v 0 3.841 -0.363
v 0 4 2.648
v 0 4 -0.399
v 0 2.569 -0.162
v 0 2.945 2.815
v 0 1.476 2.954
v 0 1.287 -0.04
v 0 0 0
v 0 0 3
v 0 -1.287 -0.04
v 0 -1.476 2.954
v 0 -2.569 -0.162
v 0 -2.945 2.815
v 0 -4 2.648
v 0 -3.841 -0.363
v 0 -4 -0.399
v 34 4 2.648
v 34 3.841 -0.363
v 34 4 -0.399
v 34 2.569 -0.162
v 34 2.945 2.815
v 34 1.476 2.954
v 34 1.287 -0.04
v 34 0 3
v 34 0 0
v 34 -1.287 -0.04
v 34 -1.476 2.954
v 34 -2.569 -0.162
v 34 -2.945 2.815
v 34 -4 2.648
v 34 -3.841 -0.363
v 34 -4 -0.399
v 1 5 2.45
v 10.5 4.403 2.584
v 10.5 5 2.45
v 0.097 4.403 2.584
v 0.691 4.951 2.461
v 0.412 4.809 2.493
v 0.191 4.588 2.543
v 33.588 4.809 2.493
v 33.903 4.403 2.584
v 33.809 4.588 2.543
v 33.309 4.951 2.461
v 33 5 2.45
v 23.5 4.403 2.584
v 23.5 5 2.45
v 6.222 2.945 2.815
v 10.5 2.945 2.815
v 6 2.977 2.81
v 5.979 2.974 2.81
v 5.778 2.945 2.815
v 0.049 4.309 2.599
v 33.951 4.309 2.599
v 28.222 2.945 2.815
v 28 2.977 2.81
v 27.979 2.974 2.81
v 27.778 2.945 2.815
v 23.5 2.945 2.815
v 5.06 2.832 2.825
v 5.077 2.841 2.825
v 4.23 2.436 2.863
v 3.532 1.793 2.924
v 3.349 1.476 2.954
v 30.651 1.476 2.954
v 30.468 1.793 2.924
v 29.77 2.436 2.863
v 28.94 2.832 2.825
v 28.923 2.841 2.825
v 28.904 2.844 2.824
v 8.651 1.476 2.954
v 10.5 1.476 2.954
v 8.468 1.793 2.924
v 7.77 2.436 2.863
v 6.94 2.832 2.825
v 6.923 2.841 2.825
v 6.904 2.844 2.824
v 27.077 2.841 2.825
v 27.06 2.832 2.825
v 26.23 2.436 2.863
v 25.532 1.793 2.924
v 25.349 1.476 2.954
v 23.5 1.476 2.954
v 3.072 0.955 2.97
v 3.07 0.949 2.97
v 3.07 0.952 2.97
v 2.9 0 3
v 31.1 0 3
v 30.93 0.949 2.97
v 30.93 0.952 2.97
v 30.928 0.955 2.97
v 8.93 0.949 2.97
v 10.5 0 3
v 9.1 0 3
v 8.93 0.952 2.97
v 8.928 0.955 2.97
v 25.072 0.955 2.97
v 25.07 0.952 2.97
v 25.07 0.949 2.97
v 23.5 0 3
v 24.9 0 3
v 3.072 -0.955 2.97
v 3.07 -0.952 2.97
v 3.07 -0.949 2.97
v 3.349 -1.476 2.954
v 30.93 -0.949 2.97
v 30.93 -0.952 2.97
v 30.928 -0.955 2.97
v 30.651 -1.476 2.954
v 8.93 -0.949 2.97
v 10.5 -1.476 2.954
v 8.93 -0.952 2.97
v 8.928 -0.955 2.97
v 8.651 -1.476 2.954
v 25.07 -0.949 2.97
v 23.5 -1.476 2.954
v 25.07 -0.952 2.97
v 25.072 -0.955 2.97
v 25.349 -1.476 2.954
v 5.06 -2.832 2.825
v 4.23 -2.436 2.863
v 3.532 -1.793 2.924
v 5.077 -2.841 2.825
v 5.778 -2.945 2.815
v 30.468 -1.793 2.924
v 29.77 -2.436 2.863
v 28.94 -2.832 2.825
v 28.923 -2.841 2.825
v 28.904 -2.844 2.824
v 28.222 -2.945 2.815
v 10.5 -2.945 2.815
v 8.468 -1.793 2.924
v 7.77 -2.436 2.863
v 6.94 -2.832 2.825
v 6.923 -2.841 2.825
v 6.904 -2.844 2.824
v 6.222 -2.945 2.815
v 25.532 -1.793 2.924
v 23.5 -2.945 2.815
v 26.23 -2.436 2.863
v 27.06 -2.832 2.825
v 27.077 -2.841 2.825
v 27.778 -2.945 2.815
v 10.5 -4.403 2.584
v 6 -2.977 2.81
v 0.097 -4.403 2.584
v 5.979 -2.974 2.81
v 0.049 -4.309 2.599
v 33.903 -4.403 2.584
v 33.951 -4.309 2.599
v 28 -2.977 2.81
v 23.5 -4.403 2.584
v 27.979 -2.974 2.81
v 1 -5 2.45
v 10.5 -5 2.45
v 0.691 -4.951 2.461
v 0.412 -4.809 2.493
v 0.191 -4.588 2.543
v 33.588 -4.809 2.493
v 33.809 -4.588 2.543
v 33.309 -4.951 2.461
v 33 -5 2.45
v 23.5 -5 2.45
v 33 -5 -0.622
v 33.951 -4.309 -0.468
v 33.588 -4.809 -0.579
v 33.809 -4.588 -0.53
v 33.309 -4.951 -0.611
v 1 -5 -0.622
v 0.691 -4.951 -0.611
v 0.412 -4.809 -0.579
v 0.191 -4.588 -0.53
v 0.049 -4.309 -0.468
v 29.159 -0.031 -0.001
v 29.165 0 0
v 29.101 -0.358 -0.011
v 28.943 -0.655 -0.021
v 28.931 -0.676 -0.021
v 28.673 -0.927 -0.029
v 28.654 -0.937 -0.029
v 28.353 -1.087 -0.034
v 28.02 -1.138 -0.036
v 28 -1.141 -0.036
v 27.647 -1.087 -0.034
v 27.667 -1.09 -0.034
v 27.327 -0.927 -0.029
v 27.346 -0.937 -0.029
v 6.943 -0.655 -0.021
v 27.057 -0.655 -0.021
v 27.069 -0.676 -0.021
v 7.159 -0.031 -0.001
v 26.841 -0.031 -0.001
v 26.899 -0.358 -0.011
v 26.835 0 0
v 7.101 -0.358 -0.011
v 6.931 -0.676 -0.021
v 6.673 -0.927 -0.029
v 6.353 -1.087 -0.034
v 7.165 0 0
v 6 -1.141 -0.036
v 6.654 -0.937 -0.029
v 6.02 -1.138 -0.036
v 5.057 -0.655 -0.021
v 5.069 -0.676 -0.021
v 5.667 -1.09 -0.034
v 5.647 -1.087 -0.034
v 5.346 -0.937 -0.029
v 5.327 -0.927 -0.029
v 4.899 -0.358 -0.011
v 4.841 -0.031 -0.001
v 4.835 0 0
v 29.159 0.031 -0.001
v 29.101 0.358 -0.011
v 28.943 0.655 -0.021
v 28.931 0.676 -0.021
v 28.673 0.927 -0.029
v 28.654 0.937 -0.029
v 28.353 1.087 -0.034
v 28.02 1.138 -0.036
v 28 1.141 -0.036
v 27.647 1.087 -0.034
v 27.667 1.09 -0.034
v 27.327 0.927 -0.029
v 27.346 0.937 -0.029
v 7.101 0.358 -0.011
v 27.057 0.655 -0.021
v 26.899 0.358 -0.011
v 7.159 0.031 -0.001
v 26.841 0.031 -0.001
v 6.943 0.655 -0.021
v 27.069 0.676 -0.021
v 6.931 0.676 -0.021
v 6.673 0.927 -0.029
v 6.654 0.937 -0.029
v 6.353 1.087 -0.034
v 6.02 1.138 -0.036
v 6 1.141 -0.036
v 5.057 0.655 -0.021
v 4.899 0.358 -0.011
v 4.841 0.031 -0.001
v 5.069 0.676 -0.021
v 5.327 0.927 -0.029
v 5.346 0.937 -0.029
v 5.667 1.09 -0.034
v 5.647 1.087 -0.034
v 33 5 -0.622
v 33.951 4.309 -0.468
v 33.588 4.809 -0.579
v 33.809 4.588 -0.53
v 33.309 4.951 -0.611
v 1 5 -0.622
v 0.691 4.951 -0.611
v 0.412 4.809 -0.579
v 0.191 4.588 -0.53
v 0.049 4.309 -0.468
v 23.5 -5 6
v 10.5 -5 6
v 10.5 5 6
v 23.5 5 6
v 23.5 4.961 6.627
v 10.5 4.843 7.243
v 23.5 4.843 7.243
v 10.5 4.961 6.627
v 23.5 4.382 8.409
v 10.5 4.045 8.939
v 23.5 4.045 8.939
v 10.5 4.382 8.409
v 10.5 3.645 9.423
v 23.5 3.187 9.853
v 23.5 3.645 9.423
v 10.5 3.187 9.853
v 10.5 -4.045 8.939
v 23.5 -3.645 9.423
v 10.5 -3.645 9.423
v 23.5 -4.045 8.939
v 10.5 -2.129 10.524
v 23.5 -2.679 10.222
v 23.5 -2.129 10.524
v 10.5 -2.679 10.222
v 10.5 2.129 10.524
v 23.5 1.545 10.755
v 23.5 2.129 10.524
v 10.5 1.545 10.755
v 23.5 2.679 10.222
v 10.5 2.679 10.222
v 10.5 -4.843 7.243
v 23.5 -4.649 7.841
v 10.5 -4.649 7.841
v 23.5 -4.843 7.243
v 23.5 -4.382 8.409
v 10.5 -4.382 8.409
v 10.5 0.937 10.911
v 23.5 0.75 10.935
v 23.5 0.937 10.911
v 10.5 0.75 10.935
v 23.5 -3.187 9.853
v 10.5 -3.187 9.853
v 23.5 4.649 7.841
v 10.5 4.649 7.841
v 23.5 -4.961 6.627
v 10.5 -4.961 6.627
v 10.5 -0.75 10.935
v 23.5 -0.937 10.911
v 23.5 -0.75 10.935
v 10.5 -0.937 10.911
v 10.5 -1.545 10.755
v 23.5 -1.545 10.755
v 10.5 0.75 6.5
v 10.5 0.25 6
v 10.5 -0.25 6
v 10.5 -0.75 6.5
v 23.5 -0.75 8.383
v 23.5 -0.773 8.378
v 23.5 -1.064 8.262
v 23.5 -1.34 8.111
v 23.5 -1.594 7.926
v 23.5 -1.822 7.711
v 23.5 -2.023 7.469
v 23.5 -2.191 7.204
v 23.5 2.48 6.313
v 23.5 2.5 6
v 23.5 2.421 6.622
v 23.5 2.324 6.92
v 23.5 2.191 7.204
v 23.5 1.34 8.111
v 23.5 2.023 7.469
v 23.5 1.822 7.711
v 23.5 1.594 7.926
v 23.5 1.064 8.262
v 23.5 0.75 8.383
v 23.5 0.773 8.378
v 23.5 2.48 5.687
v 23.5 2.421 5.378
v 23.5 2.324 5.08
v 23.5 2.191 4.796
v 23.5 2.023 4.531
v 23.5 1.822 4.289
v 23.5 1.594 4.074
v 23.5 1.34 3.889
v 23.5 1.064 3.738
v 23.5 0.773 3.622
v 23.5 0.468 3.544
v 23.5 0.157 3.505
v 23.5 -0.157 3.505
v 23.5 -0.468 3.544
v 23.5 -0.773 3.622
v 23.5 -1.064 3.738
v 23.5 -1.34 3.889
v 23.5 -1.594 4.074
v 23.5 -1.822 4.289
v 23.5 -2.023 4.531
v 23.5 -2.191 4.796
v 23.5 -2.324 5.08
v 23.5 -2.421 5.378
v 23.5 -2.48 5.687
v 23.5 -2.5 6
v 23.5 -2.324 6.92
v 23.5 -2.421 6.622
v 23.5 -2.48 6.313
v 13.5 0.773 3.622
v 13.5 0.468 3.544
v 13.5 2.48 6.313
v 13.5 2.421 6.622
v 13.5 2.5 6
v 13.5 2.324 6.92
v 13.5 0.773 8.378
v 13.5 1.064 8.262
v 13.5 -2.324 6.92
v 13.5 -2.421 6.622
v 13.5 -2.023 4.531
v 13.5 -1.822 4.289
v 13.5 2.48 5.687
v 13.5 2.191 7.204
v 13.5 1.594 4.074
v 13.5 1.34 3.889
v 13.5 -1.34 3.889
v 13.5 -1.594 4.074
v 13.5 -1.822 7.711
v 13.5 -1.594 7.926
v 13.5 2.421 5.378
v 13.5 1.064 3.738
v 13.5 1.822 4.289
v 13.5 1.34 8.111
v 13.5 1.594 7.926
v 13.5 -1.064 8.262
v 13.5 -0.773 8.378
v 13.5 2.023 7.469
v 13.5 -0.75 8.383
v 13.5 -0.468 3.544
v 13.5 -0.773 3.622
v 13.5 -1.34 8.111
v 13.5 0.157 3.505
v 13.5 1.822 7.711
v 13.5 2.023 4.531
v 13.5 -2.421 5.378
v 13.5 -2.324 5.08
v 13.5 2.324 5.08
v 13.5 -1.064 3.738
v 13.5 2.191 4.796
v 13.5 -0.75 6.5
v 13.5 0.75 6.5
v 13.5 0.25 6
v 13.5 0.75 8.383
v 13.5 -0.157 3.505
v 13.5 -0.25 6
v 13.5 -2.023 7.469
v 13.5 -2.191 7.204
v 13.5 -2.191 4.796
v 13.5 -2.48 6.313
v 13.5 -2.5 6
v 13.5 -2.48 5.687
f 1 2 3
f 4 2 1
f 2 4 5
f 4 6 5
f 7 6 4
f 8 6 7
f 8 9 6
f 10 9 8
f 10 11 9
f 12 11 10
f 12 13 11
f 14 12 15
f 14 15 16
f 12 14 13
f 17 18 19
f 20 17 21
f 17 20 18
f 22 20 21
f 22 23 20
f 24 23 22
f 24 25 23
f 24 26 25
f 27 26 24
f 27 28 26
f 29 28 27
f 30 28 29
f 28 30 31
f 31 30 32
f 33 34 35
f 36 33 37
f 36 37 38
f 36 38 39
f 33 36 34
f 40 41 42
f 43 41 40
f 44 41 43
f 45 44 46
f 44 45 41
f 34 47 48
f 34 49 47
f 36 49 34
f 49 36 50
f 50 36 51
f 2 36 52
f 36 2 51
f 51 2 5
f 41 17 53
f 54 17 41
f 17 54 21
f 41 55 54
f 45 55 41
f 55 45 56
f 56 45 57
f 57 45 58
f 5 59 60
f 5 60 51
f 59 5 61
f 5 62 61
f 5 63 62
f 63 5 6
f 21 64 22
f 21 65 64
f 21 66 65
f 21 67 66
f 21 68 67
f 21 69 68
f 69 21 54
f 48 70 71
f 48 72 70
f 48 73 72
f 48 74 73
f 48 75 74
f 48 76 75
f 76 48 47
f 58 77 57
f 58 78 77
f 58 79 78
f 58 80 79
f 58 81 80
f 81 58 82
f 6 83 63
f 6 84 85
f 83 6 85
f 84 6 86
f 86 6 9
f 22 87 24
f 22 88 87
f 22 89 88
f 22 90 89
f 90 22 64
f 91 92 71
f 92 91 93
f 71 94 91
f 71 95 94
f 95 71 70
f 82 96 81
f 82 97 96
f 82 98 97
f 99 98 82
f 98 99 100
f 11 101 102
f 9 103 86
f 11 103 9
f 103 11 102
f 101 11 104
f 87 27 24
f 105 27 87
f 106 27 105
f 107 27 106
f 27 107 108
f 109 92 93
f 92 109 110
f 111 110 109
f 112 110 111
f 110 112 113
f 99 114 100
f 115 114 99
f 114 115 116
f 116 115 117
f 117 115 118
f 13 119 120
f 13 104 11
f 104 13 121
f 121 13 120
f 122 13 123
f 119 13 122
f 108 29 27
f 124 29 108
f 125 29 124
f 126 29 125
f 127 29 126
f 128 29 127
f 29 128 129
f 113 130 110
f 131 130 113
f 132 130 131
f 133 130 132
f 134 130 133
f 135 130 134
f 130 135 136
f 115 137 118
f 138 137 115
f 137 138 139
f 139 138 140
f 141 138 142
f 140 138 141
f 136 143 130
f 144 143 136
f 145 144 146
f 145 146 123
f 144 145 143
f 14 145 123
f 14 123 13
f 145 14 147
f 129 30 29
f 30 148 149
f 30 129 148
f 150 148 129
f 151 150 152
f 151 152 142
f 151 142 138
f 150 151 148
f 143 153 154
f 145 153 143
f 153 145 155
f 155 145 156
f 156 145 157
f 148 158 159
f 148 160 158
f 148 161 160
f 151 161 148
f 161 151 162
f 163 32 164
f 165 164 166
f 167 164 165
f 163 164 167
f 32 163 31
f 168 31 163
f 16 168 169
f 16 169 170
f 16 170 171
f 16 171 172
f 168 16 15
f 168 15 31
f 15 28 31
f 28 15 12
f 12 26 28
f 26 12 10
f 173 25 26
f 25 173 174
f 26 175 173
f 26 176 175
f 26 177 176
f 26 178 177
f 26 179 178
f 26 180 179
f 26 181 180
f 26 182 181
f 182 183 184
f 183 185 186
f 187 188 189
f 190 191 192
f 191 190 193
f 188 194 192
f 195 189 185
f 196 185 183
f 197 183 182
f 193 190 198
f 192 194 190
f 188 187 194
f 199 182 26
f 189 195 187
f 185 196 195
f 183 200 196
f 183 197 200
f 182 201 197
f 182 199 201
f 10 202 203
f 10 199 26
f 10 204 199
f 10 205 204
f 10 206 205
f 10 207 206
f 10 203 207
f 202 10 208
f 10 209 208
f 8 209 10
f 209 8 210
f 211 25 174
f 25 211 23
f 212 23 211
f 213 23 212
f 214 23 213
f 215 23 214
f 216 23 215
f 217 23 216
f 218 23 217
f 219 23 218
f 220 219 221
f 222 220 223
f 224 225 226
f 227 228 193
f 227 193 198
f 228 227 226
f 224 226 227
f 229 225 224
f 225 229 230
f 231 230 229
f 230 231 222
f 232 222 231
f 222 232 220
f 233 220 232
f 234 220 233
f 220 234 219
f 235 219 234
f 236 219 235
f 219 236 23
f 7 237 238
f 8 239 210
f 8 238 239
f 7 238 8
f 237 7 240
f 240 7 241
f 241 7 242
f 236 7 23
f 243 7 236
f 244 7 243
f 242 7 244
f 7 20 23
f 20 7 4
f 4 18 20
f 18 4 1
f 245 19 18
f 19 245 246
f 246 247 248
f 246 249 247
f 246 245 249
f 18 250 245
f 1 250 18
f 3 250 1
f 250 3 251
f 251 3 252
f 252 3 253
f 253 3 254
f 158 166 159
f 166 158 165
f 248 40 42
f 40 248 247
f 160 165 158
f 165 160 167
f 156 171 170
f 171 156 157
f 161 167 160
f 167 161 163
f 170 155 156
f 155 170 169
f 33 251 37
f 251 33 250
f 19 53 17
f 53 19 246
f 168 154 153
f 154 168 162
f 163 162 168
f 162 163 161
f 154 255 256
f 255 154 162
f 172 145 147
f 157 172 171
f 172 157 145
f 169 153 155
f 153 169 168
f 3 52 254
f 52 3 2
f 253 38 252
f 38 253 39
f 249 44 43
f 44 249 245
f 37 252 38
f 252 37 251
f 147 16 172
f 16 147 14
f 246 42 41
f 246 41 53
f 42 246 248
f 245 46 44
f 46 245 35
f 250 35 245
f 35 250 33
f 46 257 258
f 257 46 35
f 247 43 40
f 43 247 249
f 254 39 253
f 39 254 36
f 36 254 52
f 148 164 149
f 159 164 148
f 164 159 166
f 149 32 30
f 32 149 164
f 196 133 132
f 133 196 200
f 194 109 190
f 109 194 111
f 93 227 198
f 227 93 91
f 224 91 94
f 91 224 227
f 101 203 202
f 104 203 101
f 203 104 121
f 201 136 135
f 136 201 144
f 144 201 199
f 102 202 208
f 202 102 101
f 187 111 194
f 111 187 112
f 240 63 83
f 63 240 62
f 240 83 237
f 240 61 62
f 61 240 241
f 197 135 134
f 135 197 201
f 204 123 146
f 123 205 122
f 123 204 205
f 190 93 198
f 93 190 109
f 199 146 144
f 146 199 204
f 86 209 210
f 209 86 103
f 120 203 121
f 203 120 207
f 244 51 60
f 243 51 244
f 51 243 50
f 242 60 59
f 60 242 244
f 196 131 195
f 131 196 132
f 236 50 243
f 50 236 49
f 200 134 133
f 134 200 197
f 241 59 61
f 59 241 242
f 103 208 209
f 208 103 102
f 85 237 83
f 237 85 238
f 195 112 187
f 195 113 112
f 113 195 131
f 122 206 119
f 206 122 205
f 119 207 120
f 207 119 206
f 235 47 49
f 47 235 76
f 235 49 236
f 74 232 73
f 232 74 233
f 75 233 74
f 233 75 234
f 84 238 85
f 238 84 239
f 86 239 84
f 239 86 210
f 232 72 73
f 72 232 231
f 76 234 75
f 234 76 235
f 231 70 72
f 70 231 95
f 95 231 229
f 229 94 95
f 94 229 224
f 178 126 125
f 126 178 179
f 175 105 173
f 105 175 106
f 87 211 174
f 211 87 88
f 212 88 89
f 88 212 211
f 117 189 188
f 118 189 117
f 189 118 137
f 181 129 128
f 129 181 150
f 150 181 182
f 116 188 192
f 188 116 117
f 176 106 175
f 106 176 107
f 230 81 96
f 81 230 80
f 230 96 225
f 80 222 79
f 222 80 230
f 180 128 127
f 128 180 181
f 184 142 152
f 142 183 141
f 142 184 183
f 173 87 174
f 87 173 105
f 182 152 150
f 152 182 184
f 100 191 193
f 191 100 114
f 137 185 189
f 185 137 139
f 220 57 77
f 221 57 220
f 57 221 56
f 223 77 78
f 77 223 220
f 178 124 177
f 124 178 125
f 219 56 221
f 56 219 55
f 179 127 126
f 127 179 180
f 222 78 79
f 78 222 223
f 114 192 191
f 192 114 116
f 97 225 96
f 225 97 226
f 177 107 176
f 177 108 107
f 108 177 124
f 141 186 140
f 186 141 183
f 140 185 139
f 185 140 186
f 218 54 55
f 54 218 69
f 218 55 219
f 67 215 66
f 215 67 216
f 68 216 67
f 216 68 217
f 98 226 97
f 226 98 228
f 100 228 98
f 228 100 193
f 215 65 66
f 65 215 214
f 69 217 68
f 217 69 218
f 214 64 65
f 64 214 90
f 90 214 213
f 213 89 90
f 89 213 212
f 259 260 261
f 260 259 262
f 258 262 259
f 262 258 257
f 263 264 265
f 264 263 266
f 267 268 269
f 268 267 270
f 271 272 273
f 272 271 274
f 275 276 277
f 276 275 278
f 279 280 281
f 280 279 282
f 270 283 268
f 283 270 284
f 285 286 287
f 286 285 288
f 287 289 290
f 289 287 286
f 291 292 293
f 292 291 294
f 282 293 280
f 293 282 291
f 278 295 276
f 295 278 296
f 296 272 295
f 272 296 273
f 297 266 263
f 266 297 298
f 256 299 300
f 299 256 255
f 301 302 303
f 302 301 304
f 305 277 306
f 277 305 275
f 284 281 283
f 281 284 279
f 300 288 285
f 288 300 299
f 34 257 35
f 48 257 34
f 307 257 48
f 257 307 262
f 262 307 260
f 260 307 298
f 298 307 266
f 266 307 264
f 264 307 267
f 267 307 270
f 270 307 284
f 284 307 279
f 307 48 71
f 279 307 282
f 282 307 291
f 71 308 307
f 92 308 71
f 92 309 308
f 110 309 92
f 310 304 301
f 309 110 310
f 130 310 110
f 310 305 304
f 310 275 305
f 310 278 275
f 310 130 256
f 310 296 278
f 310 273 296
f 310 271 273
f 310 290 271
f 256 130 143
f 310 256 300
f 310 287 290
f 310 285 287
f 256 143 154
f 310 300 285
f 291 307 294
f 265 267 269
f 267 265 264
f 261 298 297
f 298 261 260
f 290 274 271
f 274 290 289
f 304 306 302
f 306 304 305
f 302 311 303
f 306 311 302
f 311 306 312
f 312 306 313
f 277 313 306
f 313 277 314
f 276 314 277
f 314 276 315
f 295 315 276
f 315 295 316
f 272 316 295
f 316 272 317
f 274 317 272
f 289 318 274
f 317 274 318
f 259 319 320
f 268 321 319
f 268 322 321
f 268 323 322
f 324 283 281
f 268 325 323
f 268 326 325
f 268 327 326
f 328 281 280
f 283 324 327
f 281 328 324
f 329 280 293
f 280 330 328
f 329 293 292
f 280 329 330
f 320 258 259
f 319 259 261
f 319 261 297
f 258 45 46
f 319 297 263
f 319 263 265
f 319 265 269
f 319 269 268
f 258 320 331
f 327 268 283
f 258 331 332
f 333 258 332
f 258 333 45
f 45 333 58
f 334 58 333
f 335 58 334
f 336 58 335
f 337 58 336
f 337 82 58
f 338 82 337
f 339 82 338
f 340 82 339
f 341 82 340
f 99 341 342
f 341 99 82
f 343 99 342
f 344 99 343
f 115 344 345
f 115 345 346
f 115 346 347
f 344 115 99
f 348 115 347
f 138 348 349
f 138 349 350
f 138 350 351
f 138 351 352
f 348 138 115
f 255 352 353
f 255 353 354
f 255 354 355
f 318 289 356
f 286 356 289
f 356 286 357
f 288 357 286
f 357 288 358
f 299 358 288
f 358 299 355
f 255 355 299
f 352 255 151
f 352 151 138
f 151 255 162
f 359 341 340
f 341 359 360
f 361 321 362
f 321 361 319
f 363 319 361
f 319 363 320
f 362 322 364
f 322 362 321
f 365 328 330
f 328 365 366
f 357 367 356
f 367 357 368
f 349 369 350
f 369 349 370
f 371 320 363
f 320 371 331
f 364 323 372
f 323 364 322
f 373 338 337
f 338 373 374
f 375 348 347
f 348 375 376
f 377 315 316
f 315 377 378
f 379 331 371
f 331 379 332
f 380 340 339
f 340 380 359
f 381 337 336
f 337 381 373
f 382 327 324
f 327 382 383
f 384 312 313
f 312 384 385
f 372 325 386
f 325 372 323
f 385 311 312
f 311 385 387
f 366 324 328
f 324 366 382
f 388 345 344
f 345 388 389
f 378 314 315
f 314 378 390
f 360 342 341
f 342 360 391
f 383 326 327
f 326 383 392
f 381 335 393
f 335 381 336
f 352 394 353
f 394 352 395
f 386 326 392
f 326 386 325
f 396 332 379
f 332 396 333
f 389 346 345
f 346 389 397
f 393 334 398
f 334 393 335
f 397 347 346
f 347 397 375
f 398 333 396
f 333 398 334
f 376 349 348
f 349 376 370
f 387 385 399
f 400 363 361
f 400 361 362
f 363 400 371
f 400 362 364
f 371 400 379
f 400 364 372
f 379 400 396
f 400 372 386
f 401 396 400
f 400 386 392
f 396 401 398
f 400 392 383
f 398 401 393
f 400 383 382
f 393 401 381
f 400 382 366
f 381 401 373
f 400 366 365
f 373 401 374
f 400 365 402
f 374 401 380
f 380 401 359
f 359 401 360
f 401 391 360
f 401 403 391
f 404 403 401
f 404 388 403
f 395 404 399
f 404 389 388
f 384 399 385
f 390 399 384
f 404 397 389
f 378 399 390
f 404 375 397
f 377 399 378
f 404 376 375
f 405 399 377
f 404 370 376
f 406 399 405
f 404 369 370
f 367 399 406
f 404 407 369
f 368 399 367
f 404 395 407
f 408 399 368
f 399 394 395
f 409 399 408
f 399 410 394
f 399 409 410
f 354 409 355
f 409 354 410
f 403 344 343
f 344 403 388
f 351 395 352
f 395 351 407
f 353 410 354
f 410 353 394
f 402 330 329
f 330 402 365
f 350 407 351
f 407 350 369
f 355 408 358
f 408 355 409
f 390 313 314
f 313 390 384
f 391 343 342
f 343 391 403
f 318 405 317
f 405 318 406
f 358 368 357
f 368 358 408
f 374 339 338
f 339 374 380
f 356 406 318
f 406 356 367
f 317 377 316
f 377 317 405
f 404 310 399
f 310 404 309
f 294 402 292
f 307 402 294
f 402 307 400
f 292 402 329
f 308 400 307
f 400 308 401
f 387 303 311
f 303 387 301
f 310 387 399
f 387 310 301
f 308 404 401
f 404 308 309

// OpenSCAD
module sector(radius, angles, fn = 24) {
    r = radius / cos(180 / fn);
    step = -360 / fn;

    points = concat([[0, 0]],
        [for(a = [angles[0] : step : angles[1] - 360]) 
            [r * cos(a), r * sin(a)]
        ],
        [[r * cos(angles[1]), r * sin(angles[1])]]
    );

    difference() {
        circle(radius, $fn = fn);
        polygon(points);
    }
}

module arc(radius, angles, width = 1, fn = 24) {
    difference() {
        sector(radius + width, angles, fn);
        sector(radius, angles, fn);
    }
} 

module support() {
    // the piece that bolts on the frame tube

    DIA = 41; // the bicycle frame tube
    THK = 3; // the thickness of the piece 
    LEN = 34; // 37 the length of the piece
    WDT = 10; 
    
    difference() {  
        //the plate
        intersection() {
            //the arc
            translate([0,0,-DIA/2]) rotate([90,0,90]) 
            linear_extrude(LEN) arc(DIA/2, [75, 105], THK, fn=100);
            
            //the rounding
            translate([0,-WDT/2,-THK]) linear_extrude(height=THK*2) 
                offset(r=1,$fn=20) offset(r=-1,$fn=20) square([LEN, WDT]);
            
        }
        //the crew holes    
        R2 = 3.1; 
        R1 = 1.1;
        H = 3.1 ;
        OFS = 6; //offset of hole from the edge
    
        union(){
            //color("red") {
            translate([OFS,0, -0.1]) 
            cylinder(h=H,r1=R1,r2=R2, $fn=20);

            translate([LEN-OFS,0, -0.1])
            cylinder(h=H,r1=R1,r2=R2, $fn=20);
        }
    }
}


module stopper() {
    // the cable stopper

    LEN = 12+1; // mm length
    D1 = 5; // mm inner ring diam
    D2 = 10; // mm outer ring diam
    CCT = 1.5; // mm bowden cutout
    
    translate([0,0,0]) rotate([90,0,90])
    difference(){
    //color("red"){
        union() {
            //the outer ring
            cylinder(d=D2, h=LEN,$fn=50);
            // the lower stright part
            translate([-D2/2,-D2/2,0]) cube([D2,D2/2, LEN]);
        }
        // the inner ring 
        translate([0,0,3]) cylinder(d=D1, h=LEN, $fn=50);
        //the bowden cutout
        translate([-CCT/2,0,0]) linear_extrude(height=LEN) 
        offset(0.5) offset(-0.5) square([CCT,LEN]);
    }    
}


support();
translate([(34-13)/2,0,6])
stopper(); 
